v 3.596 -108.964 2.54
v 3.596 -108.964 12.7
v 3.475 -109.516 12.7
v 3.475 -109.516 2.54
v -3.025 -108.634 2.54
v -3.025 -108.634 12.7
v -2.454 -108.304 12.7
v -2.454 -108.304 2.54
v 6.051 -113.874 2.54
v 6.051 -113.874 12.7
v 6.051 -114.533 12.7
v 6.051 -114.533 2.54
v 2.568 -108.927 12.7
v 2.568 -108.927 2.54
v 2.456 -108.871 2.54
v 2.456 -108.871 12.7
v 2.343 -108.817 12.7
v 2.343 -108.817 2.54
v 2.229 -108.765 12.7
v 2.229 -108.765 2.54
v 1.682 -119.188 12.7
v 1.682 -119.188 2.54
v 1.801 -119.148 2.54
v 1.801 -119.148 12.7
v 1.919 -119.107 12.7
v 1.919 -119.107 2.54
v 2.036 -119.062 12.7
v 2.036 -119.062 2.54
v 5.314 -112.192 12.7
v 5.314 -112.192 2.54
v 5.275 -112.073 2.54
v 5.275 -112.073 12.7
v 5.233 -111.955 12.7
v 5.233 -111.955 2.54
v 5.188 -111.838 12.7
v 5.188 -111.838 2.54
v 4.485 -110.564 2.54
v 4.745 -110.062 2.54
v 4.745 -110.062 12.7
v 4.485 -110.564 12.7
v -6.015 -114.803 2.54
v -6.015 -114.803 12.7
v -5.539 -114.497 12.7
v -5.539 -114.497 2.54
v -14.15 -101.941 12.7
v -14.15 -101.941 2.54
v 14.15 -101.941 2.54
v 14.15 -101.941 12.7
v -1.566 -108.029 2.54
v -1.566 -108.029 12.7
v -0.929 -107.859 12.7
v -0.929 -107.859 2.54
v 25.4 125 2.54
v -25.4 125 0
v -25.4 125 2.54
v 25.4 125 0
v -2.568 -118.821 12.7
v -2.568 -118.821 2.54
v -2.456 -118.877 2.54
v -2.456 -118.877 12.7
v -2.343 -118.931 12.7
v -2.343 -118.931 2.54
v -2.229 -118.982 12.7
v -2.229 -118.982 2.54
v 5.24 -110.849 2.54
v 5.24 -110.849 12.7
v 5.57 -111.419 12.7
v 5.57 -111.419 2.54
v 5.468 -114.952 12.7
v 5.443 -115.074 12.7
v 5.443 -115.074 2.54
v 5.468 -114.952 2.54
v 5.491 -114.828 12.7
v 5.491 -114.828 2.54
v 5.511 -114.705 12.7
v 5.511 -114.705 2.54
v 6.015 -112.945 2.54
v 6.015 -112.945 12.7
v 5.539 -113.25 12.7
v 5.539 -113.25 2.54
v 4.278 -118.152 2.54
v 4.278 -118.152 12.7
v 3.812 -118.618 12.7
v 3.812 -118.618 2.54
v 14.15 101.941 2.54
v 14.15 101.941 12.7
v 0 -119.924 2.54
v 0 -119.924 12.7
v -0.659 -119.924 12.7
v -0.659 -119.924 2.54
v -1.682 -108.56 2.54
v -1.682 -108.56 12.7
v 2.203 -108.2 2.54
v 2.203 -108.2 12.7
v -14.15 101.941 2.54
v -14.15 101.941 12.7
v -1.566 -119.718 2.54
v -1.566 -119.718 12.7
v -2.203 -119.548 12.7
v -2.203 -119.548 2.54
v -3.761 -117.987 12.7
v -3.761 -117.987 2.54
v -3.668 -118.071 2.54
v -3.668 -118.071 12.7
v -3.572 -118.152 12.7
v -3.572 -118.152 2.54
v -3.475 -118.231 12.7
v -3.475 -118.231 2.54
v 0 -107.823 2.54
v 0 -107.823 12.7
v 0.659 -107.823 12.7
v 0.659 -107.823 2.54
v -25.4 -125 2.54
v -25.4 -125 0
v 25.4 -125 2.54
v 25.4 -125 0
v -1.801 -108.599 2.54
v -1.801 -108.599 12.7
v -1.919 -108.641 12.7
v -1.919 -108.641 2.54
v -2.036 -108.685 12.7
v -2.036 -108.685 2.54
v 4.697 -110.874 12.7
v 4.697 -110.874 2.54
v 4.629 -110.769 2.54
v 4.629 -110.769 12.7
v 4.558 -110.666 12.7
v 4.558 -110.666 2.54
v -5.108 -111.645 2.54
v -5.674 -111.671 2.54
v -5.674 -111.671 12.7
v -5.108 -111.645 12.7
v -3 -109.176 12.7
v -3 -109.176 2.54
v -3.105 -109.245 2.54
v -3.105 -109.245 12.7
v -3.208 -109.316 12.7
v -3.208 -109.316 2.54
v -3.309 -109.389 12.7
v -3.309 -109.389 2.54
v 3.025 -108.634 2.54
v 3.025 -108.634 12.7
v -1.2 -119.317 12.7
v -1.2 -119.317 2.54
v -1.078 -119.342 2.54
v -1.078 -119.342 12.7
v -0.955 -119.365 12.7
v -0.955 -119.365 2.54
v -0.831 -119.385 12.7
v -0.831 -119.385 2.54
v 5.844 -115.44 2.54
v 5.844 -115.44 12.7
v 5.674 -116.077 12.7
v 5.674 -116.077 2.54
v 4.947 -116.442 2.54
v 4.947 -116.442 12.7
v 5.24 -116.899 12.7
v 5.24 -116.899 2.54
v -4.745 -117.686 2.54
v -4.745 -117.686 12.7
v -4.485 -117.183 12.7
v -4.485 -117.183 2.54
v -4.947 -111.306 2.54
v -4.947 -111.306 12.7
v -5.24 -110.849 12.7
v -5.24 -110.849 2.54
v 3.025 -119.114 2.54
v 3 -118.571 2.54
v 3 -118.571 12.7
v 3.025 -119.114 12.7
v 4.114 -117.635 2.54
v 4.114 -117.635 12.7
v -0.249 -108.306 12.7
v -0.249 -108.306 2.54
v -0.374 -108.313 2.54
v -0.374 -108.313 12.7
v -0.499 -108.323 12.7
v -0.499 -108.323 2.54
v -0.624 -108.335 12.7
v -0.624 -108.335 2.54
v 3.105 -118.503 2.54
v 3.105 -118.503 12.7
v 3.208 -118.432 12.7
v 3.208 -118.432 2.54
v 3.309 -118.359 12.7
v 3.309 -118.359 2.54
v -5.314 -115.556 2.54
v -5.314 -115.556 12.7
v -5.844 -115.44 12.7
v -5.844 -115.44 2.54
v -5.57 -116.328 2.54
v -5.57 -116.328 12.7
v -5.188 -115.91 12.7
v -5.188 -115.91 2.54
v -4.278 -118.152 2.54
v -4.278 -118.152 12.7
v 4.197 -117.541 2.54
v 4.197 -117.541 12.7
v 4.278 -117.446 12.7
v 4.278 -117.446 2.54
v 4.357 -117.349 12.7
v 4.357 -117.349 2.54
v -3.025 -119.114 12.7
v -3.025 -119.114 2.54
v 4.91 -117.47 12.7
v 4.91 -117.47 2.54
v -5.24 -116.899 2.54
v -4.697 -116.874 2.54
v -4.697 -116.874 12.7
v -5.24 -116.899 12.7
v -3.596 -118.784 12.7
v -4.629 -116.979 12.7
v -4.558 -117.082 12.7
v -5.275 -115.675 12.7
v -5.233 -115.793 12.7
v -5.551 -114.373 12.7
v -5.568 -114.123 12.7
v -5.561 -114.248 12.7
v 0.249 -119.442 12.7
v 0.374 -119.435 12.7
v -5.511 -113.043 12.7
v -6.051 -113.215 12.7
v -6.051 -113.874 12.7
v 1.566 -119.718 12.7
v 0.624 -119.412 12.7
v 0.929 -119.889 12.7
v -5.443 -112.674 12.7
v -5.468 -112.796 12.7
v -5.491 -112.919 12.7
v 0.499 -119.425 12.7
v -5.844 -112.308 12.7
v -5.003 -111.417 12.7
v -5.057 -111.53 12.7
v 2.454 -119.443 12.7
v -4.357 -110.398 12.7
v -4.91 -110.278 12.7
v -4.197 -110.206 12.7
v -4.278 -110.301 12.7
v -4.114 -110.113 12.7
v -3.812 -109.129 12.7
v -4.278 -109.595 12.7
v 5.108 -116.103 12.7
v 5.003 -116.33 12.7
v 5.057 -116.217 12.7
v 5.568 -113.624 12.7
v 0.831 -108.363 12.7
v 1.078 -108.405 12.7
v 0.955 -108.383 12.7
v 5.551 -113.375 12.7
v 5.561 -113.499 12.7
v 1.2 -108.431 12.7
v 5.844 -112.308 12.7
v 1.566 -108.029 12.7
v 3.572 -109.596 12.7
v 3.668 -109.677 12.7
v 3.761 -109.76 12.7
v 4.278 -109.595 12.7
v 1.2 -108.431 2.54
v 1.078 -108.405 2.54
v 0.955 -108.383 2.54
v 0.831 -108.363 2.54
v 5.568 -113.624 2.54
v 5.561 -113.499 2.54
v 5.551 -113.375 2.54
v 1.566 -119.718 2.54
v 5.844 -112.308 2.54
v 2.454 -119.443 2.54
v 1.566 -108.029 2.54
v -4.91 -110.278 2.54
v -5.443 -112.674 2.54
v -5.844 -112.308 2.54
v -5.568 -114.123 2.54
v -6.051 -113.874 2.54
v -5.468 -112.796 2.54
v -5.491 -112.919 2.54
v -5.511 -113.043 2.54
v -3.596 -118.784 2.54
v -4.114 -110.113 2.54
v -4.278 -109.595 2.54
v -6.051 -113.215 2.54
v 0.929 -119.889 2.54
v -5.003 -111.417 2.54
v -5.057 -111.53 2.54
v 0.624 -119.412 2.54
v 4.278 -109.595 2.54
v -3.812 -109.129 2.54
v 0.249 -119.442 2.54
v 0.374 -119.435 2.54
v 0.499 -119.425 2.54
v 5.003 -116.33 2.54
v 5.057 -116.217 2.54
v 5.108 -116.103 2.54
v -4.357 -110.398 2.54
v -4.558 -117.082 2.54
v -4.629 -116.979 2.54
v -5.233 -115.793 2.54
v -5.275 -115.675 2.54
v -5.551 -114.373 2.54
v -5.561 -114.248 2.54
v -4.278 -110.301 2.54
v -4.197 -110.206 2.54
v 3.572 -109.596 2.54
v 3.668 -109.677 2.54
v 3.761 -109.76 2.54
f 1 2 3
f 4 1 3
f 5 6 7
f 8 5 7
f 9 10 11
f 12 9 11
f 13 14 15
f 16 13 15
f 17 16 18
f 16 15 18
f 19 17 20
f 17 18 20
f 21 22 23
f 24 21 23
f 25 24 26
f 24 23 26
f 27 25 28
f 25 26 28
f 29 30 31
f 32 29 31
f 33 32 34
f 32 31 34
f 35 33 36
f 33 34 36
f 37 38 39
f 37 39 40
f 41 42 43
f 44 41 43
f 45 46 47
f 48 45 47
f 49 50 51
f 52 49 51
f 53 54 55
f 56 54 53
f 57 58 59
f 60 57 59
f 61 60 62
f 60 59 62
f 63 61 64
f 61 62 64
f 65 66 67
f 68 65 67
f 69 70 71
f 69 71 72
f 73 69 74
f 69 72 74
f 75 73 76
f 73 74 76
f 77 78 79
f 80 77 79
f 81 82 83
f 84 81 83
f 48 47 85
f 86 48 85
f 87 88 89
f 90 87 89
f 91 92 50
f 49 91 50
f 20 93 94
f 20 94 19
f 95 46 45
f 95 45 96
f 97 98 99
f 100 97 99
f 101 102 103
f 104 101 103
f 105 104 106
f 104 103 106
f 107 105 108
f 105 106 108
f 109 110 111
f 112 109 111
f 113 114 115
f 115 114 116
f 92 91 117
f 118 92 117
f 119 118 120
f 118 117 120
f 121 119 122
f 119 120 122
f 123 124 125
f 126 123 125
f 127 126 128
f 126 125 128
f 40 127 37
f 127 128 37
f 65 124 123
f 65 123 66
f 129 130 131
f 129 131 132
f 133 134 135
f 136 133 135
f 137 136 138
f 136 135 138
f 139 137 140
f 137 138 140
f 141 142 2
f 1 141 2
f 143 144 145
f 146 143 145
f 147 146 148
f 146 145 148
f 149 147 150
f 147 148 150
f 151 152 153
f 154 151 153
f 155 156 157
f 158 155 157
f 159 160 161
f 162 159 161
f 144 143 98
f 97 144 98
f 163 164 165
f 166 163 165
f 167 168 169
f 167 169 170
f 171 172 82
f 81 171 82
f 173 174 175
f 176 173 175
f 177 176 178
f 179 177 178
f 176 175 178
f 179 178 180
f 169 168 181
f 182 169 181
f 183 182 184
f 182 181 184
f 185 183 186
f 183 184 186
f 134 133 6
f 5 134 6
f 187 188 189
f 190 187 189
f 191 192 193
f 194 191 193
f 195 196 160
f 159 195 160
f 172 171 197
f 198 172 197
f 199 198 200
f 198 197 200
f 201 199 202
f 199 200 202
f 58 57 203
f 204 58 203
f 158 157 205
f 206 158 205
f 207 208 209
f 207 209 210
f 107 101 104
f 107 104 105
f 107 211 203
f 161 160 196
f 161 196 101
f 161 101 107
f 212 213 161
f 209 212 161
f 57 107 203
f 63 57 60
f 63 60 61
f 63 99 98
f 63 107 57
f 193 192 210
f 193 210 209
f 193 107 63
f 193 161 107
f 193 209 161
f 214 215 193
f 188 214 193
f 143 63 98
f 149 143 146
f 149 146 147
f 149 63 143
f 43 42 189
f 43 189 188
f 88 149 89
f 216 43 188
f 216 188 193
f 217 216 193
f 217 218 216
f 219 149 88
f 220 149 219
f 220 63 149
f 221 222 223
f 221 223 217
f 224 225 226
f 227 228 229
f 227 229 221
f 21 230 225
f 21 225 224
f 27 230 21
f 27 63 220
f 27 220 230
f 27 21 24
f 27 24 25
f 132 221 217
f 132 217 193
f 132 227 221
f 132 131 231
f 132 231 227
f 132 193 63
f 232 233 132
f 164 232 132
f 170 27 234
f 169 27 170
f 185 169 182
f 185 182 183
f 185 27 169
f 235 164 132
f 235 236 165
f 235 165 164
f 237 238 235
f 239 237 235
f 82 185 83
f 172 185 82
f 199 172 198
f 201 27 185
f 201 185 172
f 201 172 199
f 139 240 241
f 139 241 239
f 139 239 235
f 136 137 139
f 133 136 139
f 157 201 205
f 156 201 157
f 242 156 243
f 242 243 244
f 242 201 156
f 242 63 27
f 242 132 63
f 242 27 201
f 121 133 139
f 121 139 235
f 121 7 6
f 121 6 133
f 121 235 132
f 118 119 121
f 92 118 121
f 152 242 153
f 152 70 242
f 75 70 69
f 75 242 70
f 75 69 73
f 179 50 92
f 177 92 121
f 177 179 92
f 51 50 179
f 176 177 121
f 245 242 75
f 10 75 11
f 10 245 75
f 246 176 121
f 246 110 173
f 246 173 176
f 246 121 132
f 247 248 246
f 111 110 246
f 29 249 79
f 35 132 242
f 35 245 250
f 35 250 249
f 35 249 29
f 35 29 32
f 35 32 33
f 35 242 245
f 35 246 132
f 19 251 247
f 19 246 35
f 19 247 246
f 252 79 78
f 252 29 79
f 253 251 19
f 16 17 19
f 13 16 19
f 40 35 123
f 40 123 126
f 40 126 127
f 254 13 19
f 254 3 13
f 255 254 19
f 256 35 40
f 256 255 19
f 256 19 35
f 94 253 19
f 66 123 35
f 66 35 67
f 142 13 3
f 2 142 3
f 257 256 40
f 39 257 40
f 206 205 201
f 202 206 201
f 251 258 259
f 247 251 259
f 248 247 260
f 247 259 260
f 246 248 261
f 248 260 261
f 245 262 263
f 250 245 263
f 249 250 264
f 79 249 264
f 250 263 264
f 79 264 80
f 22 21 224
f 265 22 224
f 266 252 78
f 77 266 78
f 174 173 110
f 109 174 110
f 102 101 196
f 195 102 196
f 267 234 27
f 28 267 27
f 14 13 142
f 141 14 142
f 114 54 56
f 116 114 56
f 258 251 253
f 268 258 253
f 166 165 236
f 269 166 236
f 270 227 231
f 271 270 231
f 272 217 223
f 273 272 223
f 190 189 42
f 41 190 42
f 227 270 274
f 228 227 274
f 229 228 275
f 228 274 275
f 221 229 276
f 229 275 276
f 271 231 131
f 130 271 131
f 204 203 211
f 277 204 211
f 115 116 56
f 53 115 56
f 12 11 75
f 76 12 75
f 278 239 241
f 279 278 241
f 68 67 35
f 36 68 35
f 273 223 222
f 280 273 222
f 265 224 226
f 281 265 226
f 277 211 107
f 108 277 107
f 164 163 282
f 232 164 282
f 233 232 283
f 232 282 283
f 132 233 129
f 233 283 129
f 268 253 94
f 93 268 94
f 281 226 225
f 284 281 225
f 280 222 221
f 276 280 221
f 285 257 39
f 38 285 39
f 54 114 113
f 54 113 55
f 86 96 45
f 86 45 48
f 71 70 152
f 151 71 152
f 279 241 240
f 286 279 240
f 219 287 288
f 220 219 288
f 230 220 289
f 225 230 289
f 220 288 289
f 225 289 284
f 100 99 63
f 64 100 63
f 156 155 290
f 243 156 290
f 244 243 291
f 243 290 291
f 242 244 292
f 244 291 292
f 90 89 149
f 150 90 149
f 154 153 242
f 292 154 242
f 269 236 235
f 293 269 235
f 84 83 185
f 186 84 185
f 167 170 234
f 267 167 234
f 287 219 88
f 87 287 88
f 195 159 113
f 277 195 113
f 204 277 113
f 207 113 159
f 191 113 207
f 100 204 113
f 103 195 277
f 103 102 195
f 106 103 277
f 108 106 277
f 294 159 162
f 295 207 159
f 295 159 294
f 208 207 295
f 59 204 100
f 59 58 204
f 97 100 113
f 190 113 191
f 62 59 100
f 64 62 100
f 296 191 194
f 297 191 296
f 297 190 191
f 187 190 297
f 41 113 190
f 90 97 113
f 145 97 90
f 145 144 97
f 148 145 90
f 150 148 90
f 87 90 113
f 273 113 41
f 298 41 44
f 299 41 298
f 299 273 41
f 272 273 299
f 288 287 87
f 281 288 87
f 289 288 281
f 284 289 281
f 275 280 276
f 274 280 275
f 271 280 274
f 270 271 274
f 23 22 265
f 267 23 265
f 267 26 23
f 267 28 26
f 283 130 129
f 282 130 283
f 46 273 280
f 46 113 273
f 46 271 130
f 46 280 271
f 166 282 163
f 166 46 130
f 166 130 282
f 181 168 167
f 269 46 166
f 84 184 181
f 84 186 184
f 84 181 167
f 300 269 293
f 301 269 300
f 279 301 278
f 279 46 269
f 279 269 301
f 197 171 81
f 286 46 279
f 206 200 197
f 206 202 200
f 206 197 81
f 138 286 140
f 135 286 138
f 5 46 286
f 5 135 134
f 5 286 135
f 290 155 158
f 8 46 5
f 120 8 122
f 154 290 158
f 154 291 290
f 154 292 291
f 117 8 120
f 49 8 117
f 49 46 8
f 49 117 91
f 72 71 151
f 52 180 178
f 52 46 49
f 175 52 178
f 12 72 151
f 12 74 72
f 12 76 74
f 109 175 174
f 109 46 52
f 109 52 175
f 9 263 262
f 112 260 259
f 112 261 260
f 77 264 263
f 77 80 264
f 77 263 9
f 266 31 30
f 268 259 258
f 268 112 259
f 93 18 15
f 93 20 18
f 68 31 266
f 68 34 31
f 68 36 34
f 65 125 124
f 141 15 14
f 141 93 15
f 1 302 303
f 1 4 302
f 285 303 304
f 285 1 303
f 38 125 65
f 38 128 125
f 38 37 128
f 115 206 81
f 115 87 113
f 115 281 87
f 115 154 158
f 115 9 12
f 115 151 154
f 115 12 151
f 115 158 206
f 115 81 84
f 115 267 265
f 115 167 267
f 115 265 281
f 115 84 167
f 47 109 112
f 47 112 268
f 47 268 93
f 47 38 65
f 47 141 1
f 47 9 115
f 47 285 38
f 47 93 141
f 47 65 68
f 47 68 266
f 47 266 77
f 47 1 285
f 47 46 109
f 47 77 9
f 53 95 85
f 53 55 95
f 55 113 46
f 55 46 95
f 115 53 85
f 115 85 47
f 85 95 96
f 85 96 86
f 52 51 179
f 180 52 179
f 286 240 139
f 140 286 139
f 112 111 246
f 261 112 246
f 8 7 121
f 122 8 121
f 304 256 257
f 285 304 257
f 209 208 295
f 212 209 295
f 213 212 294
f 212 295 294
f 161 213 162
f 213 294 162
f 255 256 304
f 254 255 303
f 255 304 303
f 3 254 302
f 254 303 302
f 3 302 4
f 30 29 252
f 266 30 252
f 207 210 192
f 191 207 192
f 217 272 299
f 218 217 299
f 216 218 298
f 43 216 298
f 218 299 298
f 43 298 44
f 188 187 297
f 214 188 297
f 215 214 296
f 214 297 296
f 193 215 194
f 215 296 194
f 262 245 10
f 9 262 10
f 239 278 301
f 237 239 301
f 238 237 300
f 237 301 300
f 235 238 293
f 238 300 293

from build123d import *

# Parameters (mm, degrees)
SKETCH1_W           = 50.8
SKETCH1_H           = 250
SKETCH1_R           = 5.573606459
SKETCH1_W_2         = 28.29928572
SKETCH1_H_2         = 203.881879194
BOSS_EXTRUDE1_DEPTH = 2.54
SKETCH1_2_W         = 28.29928572
SKETCH1_2_H         = 203.881879194
BOSS_EXTRUDE2_DEPTH = 12.7
SKETCH1_3_R         = 5.573606459
BOSS_EXTRUDE3_DEPTH = 12.7
BOSS_EXTRUDE4_DEPTH = 10.16
CIRPATTERN1_COUNT   = 24


with BuildPart() as part:
    # Sketch1 → Boss-Extrude1 (new body)
    with BuildSketch(Plane.XY):
        Rectangle(SKETCH1_W, SKETCH1_H)
        with Locations((0, -113.873825503)):
            Circle(SKETCH1_R, mode=Mode.SUBTRACT)
        Rectangle(SKETCH1_W_2, SKETCH1_H_2, mode=Mode.SUBTRACT)
    extrude(amount=BOSS_EXTRUDE1_DEPTH)

    # Sketch1<2> → Boss-Extrude2 (add)
    with BuildSketch(Plane.XY):
        Rectangle(SKETCH1_2_W, SKETCH1_2_H)
    extrude(amount=BOSS_EXTRUDE2_DEPTH)

    # Sketch1<3> → Boss-Extrude3 (add)
    with BuildSketch(Plane.XY):
        with Locations((0, -113.873825503)):
            Circle(SKETCH1_3_R)
    extrude(amount=BOSS_EXTRUDE3_DEPTH)

    # Sketch2 → Boss-Extrude4 (add)
    with BuildSketch(Plane.XY.offset(12.7)):
        Polygon((-0.665542468, -109.111248143), (0, -107.823249371), (0.659256269, -107.823249371), (1.06965096, -109.111248143), align=None)
    boss_extrude4 = extrude(amount=-BOSS_EXTRUDE4_DEPTH)

    # CirPattern1: Boss-Extrude4 ×24 about axis
    cirpattern1_axis = Axis((0, -113.873825503, 12.7), (0, 0, -1))
    for i in range(1, CIRPATTERN1_COUNT):
        add(boss_extrude4.rotate(cirpattern1_axis, i * 360 / CIRPATTERN1_COUNT))


solid = part.part
